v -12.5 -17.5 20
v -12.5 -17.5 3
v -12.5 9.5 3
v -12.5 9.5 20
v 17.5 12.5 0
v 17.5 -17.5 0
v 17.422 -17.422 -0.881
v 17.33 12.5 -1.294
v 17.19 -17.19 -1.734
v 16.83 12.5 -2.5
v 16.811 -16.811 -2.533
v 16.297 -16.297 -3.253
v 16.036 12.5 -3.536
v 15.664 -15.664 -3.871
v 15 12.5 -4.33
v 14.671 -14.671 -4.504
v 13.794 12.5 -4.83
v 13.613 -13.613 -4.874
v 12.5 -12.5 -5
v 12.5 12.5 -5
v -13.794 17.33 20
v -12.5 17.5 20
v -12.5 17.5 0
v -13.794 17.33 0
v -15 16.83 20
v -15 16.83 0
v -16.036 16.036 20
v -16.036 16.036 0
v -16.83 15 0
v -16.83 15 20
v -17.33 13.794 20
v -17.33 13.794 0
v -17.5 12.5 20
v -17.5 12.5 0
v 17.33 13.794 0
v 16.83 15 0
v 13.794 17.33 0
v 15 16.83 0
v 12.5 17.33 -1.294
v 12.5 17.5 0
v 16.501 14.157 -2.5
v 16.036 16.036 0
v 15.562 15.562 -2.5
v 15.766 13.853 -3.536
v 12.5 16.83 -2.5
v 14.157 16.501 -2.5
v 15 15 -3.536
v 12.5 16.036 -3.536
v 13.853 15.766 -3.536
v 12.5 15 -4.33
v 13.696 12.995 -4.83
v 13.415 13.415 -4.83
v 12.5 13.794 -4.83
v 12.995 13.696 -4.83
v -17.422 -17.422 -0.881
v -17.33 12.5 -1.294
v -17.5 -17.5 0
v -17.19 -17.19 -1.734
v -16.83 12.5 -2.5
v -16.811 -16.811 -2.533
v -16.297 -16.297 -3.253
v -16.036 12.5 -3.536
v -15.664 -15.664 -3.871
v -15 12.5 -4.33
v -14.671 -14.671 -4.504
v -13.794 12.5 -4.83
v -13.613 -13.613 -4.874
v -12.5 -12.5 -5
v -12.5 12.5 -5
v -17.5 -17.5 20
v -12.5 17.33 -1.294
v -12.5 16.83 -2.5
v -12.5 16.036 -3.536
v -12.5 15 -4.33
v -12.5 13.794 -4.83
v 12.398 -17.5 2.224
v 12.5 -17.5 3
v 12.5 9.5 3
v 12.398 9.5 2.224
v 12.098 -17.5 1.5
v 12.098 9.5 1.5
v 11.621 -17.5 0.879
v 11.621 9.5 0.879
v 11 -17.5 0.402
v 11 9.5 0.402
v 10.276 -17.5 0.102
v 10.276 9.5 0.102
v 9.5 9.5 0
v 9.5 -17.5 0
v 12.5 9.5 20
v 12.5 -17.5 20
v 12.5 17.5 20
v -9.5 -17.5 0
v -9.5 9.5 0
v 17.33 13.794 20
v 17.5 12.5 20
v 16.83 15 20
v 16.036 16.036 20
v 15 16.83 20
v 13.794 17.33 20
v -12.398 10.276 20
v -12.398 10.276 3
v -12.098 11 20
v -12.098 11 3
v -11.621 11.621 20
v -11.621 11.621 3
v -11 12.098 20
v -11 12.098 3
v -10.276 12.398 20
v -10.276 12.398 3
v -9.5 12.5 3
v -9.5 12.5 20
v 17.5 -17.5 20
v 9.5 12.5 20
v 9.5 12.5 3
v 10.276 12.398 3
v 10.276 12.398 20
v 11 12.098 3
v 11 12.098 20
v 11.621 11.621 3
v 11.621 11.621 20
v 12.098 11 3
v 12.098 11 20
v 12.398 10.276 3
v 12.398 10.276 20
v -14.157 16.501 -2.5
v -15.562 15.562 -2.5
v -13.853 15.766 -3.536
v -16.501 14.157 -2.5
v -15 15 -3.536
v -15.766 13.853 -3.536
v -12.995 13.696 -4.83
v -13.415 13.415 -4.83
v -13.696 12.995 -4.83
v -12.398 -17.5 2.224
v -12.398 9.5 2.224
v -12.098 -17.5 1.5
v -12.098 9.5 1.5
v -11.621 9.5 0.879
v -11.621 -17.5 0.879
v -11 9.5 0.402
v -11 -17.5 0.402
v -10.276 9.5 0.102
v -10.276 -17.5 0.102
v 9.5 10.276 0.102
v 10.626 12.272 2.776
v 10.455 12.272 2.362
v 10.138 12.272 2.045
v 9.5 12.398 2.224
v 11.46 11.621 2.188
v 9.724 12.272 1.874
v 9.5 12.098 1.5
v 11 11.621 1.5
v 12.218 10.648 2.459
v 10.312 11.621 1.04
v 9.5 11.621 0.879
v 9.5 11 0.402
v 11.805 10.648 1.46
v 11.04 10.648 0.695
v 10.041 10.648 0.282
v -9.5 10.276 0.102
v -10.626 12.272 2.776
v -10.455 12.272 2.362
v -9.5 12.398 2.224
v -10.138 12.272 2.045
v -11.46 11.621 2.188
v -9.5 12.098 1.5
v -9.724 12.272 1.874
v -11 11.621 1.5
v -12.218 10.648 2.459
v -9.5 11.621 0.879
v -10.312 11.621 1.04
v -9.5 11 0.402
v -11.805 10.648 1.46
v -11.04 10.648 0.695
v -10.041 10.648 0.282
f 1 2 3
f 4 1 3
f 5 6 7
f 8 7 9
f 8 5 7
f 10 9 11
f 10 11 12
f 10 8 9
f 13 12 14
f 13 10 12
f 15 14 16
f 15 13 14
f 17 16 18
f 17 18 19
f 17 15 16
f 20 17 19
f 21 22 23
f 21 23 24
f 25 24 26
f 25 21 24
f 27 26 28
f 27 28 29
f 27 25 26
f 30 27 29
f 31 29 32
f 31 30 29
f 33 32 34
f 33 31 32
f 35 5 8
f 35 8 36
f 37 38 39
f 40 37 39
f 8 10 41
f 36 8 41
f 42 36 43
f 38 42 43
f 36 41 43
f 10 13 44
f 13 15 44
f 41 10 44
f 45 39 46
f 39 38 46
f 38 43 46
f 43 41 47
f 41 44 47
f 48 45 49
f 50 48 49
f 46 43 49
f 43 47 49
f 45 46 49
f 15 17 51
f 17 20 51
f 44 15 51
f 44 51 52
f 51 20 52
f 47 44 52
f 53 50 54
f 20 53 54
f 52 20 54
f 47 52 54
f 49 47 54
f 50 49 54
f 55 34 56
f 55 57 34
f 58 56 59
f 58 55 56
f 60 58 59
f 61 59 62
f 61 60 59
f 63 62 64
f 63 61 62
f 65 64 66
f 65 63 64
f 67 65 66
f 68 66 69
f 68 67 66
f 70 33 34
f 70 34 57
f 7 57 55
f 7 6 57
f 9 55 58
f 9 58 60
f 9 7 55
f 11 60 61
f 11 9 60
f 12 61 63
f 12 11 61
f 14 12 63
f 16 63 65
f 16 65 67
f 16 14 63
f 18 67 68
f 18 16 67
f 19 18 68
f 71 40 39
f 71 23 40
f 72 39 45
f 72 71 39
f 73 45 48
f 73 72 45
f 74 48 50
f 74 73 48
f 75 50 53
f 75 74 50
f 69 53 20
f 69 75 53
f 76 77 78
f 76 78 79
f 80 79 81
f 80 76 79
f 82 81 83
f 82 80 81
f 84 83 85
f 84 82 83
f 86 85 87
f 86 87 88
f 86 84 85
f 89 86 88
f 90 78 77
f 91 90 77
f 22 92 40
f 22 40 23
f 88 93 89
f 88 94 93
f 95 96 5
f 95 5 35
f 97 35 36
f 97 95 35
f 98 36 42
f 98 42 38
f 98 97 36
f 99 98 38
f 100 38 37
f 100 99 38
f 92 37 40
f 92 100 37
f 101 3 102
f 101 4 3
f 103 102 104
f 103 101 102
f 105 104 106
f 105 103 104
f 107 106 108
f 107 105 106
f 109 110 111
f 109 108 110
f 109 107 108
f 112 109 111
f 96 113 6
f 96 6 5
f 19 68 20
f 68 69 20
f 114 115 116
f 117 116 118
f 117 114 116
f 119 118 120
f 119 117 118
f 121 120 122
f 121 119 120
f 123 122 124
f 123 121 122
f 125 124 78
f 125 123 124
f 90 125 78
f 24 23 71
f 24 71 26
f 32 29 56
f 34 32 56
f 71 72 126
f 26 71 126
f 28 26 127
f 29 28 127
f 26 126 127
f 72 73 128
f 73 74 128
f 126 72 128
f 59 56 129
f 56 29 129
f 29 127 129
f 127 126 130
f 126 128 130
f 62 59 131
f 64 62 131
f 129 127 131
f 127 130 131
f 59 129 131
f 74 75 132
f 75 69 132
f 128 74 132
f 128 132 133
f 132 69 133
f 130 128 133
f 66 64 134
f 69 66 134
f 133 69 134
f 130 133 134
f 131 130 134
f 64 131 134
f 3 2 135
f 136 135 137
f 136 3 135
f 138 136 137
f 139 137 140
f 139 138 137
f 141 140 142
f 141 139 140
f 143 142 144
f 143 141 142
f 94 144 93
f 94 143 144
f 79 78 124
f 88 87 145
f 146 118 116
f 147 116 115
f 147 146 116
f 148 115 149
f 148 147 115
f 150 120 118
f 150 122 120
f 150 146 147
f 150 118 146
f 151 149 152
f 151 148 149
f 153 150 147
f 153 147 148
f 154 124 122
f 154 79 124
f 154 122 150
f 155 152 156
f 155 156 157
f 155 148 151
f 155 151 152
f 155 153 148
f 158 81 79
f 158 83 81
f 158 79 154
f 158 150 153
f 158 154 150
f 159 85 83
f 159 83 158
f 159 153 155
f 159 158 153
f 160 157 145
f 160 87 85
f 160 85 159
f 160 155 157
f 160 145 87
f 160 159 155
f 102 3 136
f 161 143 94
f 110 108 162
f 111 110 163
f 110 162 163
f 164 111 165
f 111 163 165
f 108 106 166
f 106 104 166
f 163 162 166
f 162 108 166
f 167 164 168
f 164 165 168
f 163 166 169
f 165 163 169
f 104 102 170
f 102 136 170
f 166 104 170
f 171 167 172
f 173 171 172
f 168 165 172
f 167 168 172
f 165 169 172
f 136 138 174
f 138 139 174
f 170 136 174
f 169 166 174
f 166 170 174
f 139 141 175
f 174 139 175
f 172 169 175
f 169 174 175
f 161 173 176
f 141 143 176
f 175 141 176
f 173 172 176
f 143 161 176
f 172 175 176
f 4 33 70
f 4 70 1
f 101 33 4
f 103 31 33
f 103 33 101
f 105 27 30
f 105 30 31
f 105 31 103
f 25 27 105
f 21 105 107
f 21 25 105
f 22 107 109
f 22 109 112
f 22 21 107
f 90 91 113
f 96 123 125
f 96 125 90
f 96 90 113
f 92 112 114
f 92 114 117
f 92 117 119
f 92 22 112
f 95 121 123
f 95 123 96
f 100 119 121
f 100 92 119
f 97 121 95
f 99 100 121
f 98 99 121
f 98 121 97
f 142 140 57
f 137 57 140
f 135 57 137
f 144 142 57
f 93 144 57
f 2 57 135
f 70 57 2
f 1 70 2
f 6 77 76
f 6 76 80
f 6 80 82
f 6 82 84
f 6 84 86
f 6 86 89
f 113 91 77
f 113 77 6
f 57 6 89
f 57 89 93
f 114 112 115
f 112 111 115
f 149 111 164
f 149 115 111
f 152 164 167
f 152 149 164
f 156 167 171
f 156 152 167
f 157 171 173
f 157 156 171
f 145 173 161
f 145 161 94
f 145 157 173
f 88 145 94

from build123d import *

# Parameters (mm, degrees)
F1_DEPTH = 20
F0_W     = 25
F0_H     = 30
F2_DEPTH = 5
F3_R     = 4.99999
F4_R     = 3


# Not quite as in the source:
# - a fillet or chamfer is up to 0.001 mm smaller than in the source, because OpenCascade refuses the exact size


with BuildPart() as f1:
    # F0 (on Top) → F1 (new body)
    with BuildSketch(Plane.XY):
        with BuildLine():
            Line((12.5, -17.5), (17.5, -17.5))
            Line((17.5, -17.5), (17.5, 12.5))
            ThreePointArc((17.5, 12.5), (16.0355339059, 16.0355339059), (12.5, 17.5))
            Line((12.5, 17.5), (-12.5, 17.5))
            ThreePointArc((-12.5, 17.5), (-16.0355339059, 16.0355339059), (-17.5, 12.5))
            Line((-17.5, 12.5), (-17.5, -17.5))
            Line((-17.5, -17.5), (-12.5, -17.5))
            Line((-12.5, -17.5), (-12.5, 12.5))
            Line((-12.5, 12.5), (12.5, 12.5))
            Line((12.5, 12.5), (12.5, -17.5))
        make_face()
    extrude(amount=F1_DEPTH)

    # F0 (on Top) → F2 (join)
    with BuildSketch(Plane.XY):
        with Locations((0, -2.5)):
            Rectangle(F0_W, F0_H)
        with BuildLine():
            Line((12.5, -17.5), (17.5, -17.5))
            Line((17.5, -17.5), (17.5, 12.5))
            ThreePointArc((17.5, 12.5), (16.0355339059, 16.0355339059), (12.5, 17.5))
            Line((12.5, 17.5), (-12.5, 17.5))
            ThreePointArc((-12.5, 17.5), (-16.0355339059, 16.0355339059), (-17.5, 12.5))
            Line((-17.5, 12.5), (-17.5, -17.5))
            Line((-17.5, -17.5), (-12.5, -17.5))
            Line((-12.5, -17.5), (-12.5, 12.5))
            Line((-12.5, 12.5), (12.5, 12.5))
            Line((12.5, 12.5), (12.5, -17.5))
        make_face()
    extrude(amount=-F2_DEPTH)

    # F3 (radius 5 in the source; OpenCascade refuses exactly that, so slightly less here)
    f3_edges = [f1.edges().sort_by_distance(p)[0] for p in [
        (17.5, -2.5, -5),
        (16.035534, 16.035534, -5),
        (0, 17.5, -5),
        (-16.035534, 16.035534, -5),
        (-17.5, -2.5, -5),
        (0, -17.5, -5),
    ]]
    fillet(f3_edges, radius=F3_R)

    # F4
    f4_edges = [f1.edges().sort_by_distance(p)[0] for p in [
        (12.5, -2.5, 0),
        (-12.5, -2.5, 0),
        (12.5, 12.5, 10),
        (-12.5, 12.5, 10),
        (0, 12.5, 0),
    ]]
    fillet(f4_edges, radius=F4_R)


solid = f1.part
